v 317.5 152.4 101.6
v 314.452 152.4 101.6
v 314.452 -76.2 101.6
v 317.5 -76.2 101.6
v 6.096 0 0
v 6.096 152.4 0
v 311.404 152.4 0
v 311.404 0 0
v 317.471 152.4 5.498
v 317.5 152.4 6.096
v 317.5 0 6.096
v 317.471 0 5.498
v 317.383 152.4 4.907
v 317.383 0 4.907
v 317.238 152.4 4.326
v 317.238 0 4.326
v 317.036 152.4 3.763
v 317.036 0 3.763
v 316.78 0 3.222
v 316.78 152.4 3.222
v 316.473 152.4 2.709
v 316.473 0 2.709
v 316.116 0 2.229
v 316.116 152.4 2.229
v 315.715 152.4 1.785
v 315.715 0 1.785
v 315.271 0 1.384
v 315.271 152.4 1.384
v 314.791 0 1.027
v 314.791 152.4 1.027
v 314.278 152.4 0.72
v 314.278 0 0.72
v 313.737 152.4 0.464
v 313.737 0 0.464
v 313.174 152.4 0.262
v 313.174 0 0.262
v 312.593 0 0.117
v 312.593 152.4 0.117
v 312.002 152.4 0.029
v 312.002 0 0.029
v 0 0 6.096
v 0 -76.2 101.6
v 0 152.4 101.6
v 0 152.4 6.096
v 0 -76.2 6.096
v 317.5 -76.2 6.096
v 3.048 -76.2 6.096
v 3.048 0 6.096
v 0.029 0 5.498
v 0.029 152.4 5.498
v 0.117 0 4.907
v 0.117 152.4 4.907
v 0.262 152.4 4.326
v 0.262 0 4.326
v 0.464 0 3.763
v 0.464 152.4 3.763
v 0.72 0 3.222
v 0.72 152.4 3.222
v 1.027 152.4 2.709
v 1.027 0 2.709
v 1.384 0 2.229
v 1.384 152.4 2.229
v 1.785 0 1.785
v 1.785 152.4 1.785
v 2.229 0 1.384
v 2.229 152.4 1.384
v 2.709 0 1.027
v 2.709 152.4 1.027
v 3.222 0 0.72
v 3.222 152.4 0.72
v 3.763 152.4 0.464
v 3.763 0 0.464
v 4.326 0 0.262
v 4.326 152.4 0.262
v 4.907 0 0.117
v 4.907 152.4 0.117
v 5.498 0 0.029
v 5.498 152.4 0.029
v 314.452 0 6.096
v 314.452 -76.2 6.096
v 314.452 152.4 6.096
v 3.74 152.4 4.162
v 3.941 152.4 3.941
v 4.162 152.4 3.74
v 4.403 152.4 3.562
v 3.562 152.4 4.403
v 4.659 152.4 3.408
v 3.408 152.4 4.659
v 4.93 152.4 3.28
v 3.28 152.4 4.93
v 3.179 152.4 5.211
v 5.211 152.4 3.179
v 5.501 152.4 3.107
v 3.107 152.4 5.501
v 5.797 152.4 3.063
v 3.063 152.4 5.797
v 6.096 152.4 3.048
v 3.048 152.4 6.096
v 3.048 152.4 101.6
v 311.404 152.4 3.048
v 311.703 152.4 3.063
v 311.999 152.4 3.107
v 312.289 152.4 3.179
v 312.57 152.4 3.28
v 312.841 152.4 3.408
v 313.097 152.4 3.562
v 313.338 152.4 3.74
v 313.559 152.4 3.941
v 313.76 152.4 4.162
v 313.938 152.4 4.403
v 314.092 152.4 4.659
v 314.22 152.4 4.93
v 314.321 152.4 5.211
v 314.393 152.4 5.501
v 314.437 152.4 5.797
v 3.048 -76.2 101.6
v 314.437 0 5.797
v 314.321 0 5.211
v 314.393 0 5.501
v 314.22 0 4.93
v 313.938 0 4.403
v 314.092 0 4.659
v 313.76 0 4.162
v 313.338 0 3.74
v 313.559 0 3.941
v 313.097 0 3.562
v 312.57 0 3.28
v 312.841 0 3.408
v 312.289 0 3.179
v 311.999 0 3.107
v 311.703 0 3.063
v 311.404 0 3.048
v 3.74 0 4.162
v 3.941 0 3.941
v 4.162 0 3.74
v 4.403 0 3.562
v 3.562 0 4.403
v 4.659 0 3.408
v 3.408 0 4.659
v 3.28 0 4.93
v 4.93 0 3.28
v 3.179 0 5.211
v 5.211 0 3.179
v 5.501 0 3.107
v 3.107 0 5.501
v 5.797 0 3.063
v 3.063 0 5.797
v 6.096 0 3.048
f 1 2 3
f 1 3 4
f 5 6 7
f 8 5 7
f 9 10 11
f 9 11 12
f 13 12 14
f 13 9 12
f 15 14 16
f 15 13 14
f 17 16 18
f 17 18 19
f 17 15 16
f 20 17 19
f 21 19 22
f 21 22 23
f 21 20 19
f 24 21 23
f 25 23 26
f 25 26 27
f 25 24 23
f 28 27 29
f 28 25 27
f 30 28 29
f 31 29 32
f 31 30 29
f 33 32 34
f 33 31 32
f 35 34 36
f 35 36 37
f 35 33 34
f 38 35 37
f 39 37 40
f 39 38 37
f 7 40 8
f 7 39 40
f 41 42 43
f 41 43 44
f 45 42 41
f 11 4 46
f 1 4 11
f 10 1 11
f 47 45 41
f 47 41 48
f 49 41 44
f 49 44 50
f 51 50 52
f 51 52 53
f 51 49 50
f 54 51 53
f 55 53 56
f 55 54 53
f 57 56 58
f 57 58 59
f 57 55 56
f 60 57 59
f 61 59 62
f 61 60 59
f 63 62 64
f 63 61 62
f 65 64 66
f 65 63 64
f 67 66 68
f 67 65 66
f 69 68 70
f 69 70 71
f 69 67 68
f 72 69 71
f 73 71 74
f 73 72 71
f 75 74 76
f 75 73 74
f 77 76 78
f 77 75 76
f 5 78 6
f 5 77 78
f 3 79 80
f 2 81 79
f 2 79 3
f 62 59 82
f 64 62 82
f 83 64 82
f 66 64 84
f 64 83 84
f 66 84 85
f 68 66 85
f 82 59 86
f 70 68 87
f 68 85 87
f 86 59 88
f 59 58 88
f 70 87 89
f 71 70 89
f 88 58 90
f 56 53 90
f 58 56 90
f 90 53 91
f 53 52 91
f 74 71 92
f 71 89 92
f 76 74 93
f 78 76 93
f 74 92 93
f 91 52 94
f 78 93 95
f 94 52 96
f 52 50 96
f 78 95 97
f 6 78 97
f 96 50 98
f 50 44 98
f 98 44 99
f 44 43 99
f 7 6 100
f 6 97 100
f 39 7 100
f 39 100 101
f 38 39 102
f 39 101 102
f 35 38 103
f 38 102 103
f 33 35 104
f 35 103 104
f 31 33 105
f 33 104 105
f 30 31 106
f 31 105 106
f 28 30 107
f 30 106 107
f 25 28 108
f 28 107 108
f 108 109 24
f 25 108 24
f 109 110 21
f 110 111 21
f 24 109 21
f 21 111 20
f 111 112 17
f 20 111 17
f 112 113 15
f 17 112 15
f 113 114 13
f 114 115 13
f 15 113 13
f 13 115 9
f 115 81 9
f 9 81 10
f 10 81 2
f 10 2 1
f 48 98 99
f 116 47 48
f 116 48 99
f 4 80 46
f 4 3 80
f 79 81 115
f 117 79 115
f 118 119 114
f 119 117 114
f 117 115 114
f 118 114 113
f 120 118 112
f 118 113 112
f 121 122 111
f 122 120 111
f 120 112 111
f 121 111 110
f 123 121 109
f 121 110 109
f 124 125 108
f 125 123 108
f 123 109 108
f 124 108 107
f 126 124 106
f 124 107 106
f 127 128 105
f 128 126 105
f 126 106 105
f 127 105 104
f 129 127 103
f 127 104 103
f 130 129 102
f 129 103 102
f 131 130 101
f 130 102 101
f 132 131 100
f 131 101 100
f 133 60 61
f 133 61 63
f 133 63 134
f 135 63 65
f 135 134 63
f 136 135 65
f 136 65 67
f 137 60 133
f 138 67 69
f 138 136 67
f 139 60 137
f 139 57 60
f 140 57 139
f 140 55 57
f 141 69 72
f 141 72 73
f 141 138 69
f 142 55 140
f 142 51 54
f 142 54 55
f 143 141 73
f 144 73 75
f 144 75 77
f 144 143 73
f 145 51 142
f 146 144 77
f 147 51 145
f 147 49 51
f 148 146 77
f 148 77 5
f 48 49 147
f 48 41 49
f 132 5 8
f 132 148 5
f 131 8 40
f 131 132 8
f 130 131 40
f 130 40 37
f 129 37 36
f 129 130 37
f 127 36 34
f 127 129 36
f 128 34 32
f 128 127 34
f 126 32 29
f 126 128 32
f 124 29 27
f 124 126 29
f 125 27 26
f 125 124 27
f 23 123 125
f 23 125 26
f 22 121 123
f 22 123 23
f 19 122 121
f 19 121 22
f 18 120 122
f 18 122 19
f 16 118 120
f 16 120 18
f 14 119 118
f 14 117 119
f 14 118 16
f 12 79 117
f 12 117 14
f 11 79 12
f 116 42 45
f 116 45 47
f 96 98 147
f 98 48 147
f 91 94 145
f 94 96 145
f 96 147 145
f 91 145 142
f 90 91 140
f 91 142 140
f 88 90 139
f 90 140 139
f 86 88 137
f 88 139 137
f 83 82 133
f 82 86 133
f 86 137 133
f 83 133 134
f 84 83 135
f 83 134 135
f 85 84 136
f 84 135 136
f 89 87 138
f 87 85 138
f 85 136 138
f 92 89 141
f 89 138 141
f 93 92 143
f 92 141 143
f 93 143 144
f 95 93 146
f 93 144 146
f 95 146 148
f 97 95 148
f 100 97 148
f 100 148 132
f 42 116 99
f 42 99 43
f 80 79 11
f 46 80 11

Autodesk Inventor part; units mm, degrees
ref_plane "YZ Plane" through (0, 0, 0) normal (1, 0, 0) x (0, 1, 0)
ref_plane "XZ Plane" through (0, 0, 0) normal (0, 1, 0) x (-1, 0, 0)
ref_plane "XY Plane" through (0, 0, 0) normal (0, 0, 1) x (1, 0, 0)
sketch "Sketch1" plane through (0, 0, 0) normal (0, 0, 1) x (1, 0, 0)
  line L0 (0, 0) -> (317.5, 0)
  line L1 (317.5, 0) -> (317.5, 152.4)
  line L2 (317.5, 152.4) -> (0, 152.4)
  line L3 (0, 152.4) -> (0, 0)
  dimension "d0" = 317.5
  dimension "d1" = 152.4
extrude "Plate1" add sketch "Sketch1" along normal blind 3.048
sketch "Sketch2" plane through (3.048, 0, 0) normal (-1, 0, 0) x (0, -1, 0)
  line L0 (-152.4, 0) -> (0, 0)
  line L1 (0, 0) -> (0, 101.6)
  line L2 (0, 101.6) -> (-152.4, 101.6)
  line L3 (-152.4, 101.6) -> (-152.4, 0)
edge flange "Flange1" height 101.6 angle 90 thickness 3.048 bend radius 3.048 thickness toward (-1, 0, 0) relief tear relief width 3.048 relief depth 1.524 corner gap 3.048 corner form 0 edges at (0, 76.2, 3.048) (317.5, 76.2, 3.048) wall of the first edge with corners at (3.048, 152.4, 0) (3.048, 0, 0) (3.048, 0, 101.6) (3.048, 152.4, 101.6)
bend "Bend1"
corner "Corner1"
sketch "Sketch3" plane through (0, 0, 101.6) normal (0, -1, 0) x (1, 0, 0)
  line L0 (0, -95.504) -> (3.048, -95.504) projected
  line L1 (3.048, 0) -> (3.048, -95.504) projected
  line L2 (3.048, 0) -> (0, 0) projected
  line L3 (0, 0) -> (0, -95.504) projected
  line L4 (314.452, -95.504) -> (317.5, -95.504) projected
  line L5 (317.5, -95.504) -> (317.5, 0) projected
  line L6 (314.452, 0) -> (317.5, 0) projected
  line L7 (314.452, 0) -> (314.452, -95.504) projected
  point P0 (0, -101.6)
extrude "Extrusion1" add sketch "Sketch3" along normal blind 76.2
equation "\"d3\" = BendReliefWidth"
equation "\"d4\" = BendReliefDepth"
equation "\"d5\" = MinimumRemnant"
equation "\"d6\" = BendRadius"
equation "\"d9\" = BendRadius"
equation "\"d10\" = CornerReliefSize"
equation "\"d11\" = GapSize"
equation "\"d12\" = JacobiRadiusSize"
equation "\"BendRadius\" = Thickness"
equation "\"BendReliefWidth\" = Thickness"
equation "\"BendReliefDepth\" = 0.5 * Thickness"
equation "\"CornerReliefSize\" = 4 * Thickness"
equation "\"MinimumRemnant\" = 2 * Thickness"
equation "\"TransitionRadius\" = BendRadius"
equation "\"JacobiRadiusSize\" = BendRadius"
equation "\"GapSize\" = Thickness"
equation "\"d2\" = BendRadius"
equation "\"Thickness\" = 3.048"
properties part number "Chute(2)"
